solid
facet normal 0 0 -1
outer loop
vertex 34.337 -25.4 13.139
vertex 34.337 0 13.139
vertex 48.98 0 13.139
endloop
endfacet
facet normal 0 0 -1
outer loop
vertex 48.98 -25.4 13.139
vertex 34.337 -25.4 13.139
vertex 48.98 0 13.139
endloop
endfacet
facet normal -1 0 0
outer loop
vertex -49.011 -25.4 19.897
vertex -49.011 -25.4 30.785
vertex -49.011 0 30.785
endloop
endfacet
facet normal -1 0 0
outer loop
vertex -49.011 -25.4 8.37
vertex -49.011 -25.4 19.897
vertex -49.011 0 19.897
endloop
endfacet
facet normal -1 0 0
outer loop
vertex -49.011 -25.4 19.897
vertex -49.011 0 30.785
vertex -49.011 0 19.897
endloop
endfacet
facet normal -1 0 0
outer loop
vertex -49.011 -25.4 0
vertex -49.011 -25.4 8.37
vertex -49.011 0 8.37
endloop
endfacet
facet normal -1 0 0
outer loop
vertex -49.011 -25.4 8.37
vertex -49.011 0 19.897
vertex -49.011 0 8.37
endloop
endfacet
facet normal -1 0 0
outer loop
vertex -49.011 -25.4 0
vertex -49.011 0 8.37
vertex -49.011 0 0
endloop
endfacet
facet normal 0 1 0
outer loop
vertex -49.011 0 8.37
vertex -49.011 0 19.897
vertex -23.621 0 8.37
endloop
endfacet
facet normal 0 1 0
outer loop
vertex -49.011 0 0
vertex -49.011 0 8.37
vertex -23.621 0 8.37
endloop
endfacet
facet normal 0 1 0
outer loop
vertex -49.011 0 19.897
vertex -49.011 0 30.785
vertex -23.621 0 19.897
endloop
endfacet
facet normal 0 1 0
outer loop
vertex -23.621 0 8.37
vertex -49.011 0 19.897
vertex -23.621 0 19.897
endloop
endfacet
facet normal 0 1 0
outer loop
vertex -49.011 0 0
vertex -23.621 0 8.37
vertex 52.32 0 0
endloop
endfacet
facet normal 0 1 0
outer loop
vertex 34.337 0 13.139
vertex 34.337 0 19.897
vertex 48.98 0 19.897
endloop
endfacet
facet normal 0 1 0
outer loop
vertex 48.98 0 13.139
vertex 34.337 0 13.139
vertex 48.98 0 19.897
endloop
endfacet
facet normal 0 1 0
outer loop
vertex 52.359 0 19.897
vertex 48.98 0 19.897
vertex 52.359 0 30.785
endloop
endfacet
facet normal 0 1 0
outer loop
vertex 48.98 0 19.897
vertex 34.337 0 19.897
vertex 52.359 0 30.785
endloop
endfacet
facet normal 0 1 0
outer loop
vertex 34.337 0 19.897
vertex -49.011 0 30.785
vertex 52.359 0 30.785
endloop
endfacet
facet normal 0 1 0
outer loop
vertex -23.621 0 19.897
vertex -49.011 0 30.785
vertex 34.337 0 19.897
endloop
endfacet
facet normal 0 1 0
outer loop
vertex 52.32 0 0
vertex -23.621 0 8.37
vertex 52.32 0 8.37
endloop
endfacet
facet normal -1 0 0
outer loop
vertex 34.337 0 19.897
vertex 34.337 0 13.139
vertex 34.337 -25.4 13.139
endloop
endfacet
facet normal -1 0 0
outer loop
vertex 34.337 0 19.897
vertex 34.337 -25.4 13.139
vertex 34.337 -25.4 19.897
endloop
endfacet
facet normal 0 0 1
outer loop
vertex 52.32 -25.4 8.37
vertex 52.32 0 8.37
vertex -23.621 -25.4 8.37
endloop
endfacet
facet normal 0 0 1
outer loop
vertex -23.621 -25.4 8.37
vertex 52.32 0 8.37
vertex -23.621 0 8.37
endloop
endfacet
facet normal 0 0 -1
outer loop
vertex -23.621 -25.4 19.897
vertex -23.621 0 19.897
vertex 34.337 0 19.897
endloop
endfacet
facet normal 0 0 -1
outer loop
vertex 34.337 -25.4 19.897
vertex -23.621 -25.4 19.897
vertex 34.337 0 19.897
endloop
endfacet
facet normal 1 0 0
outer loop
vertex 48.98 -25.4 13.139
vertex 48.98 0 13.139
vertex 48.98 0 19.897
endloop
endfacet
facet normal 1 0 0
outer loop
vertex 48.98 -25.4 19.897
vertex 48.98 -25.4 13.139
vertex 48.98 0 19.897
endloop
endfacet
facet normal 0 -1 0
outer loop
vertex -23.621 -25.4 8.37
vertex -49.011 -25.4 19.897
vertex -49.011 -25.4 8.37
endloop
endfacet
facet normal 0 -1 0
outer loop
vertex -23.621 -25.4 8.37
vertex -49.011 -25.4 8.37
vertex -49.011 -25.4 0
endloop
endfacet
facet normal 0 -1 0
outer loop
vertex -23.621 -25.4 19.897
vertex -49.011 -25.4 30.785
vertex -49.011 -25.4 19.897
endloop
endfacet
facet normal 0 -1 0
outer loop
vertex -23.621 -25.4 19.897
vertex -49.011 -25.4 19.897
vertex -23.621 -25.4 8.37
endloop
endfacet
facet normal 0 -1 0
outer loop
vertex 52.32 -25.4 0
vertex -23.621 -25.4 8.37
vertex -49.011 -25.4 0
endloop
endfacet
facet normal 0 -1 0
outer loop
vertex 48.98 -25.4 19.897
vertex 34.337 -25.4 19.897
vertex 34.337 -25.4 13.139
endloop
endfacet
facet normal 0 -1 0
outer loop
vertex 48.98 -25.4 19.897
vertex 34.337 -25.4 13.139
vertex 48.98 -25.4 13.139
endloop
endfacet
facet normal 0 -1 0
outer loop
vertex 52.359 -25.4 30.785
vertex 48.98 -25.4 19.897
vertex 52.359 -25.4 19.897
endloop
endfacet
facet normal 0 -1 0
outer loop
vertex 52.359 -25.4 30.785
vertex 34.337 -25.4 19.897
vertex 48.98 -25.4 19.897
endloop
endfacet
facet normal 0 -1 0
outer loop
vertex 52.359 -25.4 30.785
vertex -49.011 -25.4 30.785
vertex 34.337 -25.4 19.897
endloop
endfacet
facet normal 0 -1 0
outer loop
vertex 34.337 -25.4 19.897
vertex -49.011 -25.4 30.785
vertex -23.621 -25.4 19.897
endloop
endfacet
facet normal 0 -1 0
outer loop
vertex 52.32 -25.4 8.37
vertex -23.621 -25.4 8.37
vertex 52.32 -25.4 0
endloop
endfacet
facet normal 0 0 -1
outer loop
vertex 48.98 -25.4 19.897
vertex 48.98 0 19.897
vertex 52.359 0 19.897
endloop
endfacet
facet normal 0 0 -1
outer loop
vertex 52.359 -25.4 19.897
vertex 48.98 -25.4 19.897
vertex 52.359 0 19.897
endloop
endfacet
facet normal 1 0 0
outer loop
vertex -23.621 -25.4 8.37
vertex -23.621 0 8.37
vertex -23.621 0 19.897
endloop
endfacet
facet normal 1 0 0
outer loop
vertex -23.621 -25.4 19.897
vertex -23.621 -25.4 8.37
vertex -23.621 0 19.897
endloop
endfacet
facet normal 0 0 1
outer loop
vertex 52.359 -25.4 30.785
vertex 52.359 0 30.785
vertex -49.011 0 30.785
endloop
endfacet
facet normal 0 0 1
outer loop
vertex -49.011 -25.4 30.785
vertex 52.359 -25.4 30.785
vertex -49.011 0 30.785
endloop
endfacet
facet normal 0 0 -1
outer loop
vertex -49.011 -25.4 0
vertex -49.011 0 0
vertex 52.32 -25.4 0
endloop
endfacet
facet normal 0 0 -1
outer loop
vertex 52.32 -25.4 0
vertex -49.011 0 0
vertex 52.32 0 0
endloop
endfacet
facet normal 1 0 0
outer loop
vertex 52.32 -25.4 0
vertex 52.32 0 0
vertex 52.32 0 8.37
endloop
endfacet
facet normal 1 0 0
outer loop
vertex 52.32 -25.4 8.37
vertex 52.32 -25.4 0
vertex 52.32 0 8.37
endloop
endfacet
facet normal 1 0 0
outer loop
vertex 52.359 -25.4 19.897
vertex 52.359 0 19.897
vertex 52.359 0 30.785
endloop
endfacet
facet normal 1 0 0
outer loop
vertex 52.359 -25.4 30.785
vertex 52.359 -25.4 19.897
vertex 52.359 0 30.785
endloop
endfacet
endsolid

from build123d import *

# Parameters (mm, degrees)
F0_W     = 25.3896806389
F0_H     = 11.52669359
F0_W_2   = 14.6422572434
F0_H_2   = 6.7579634488
F1_DEPTH = 25.4


with BuildPart() as f1:
    # F0 (on Front) → F1 (new body)
    with BuildSketch(Plane.XZ):
        Polygon((52.3586980999, 30.7845659554), (-49.0107499063, 30.7845659554), (-49.0107499063, 19.8967363685), (-23.6210692674, 19.8967363685), (34.3374609947, 19.8967363685), (48.9797182381, 19.8967363685), (52.3586980999, 19.8967363685), align=None)
        with Locations((-36.3159095868, 14.1333895735)):
            Rectangle(F0_W, F0_H)
        Polygon((-23.6210692674, 8.3700427786), (-49.0107499063, 8.3700427786), (-49.0107499063, 0), (52.3202158511, 0), (52.3202158511, 8.3700427786), align=None)
        with Locations((41.6585896164, 16.5177546442)):
            Rectangle(F0_W_2, F0_H_2)
    extrude(amount=F1_DEPTH)


solid = f1.part
